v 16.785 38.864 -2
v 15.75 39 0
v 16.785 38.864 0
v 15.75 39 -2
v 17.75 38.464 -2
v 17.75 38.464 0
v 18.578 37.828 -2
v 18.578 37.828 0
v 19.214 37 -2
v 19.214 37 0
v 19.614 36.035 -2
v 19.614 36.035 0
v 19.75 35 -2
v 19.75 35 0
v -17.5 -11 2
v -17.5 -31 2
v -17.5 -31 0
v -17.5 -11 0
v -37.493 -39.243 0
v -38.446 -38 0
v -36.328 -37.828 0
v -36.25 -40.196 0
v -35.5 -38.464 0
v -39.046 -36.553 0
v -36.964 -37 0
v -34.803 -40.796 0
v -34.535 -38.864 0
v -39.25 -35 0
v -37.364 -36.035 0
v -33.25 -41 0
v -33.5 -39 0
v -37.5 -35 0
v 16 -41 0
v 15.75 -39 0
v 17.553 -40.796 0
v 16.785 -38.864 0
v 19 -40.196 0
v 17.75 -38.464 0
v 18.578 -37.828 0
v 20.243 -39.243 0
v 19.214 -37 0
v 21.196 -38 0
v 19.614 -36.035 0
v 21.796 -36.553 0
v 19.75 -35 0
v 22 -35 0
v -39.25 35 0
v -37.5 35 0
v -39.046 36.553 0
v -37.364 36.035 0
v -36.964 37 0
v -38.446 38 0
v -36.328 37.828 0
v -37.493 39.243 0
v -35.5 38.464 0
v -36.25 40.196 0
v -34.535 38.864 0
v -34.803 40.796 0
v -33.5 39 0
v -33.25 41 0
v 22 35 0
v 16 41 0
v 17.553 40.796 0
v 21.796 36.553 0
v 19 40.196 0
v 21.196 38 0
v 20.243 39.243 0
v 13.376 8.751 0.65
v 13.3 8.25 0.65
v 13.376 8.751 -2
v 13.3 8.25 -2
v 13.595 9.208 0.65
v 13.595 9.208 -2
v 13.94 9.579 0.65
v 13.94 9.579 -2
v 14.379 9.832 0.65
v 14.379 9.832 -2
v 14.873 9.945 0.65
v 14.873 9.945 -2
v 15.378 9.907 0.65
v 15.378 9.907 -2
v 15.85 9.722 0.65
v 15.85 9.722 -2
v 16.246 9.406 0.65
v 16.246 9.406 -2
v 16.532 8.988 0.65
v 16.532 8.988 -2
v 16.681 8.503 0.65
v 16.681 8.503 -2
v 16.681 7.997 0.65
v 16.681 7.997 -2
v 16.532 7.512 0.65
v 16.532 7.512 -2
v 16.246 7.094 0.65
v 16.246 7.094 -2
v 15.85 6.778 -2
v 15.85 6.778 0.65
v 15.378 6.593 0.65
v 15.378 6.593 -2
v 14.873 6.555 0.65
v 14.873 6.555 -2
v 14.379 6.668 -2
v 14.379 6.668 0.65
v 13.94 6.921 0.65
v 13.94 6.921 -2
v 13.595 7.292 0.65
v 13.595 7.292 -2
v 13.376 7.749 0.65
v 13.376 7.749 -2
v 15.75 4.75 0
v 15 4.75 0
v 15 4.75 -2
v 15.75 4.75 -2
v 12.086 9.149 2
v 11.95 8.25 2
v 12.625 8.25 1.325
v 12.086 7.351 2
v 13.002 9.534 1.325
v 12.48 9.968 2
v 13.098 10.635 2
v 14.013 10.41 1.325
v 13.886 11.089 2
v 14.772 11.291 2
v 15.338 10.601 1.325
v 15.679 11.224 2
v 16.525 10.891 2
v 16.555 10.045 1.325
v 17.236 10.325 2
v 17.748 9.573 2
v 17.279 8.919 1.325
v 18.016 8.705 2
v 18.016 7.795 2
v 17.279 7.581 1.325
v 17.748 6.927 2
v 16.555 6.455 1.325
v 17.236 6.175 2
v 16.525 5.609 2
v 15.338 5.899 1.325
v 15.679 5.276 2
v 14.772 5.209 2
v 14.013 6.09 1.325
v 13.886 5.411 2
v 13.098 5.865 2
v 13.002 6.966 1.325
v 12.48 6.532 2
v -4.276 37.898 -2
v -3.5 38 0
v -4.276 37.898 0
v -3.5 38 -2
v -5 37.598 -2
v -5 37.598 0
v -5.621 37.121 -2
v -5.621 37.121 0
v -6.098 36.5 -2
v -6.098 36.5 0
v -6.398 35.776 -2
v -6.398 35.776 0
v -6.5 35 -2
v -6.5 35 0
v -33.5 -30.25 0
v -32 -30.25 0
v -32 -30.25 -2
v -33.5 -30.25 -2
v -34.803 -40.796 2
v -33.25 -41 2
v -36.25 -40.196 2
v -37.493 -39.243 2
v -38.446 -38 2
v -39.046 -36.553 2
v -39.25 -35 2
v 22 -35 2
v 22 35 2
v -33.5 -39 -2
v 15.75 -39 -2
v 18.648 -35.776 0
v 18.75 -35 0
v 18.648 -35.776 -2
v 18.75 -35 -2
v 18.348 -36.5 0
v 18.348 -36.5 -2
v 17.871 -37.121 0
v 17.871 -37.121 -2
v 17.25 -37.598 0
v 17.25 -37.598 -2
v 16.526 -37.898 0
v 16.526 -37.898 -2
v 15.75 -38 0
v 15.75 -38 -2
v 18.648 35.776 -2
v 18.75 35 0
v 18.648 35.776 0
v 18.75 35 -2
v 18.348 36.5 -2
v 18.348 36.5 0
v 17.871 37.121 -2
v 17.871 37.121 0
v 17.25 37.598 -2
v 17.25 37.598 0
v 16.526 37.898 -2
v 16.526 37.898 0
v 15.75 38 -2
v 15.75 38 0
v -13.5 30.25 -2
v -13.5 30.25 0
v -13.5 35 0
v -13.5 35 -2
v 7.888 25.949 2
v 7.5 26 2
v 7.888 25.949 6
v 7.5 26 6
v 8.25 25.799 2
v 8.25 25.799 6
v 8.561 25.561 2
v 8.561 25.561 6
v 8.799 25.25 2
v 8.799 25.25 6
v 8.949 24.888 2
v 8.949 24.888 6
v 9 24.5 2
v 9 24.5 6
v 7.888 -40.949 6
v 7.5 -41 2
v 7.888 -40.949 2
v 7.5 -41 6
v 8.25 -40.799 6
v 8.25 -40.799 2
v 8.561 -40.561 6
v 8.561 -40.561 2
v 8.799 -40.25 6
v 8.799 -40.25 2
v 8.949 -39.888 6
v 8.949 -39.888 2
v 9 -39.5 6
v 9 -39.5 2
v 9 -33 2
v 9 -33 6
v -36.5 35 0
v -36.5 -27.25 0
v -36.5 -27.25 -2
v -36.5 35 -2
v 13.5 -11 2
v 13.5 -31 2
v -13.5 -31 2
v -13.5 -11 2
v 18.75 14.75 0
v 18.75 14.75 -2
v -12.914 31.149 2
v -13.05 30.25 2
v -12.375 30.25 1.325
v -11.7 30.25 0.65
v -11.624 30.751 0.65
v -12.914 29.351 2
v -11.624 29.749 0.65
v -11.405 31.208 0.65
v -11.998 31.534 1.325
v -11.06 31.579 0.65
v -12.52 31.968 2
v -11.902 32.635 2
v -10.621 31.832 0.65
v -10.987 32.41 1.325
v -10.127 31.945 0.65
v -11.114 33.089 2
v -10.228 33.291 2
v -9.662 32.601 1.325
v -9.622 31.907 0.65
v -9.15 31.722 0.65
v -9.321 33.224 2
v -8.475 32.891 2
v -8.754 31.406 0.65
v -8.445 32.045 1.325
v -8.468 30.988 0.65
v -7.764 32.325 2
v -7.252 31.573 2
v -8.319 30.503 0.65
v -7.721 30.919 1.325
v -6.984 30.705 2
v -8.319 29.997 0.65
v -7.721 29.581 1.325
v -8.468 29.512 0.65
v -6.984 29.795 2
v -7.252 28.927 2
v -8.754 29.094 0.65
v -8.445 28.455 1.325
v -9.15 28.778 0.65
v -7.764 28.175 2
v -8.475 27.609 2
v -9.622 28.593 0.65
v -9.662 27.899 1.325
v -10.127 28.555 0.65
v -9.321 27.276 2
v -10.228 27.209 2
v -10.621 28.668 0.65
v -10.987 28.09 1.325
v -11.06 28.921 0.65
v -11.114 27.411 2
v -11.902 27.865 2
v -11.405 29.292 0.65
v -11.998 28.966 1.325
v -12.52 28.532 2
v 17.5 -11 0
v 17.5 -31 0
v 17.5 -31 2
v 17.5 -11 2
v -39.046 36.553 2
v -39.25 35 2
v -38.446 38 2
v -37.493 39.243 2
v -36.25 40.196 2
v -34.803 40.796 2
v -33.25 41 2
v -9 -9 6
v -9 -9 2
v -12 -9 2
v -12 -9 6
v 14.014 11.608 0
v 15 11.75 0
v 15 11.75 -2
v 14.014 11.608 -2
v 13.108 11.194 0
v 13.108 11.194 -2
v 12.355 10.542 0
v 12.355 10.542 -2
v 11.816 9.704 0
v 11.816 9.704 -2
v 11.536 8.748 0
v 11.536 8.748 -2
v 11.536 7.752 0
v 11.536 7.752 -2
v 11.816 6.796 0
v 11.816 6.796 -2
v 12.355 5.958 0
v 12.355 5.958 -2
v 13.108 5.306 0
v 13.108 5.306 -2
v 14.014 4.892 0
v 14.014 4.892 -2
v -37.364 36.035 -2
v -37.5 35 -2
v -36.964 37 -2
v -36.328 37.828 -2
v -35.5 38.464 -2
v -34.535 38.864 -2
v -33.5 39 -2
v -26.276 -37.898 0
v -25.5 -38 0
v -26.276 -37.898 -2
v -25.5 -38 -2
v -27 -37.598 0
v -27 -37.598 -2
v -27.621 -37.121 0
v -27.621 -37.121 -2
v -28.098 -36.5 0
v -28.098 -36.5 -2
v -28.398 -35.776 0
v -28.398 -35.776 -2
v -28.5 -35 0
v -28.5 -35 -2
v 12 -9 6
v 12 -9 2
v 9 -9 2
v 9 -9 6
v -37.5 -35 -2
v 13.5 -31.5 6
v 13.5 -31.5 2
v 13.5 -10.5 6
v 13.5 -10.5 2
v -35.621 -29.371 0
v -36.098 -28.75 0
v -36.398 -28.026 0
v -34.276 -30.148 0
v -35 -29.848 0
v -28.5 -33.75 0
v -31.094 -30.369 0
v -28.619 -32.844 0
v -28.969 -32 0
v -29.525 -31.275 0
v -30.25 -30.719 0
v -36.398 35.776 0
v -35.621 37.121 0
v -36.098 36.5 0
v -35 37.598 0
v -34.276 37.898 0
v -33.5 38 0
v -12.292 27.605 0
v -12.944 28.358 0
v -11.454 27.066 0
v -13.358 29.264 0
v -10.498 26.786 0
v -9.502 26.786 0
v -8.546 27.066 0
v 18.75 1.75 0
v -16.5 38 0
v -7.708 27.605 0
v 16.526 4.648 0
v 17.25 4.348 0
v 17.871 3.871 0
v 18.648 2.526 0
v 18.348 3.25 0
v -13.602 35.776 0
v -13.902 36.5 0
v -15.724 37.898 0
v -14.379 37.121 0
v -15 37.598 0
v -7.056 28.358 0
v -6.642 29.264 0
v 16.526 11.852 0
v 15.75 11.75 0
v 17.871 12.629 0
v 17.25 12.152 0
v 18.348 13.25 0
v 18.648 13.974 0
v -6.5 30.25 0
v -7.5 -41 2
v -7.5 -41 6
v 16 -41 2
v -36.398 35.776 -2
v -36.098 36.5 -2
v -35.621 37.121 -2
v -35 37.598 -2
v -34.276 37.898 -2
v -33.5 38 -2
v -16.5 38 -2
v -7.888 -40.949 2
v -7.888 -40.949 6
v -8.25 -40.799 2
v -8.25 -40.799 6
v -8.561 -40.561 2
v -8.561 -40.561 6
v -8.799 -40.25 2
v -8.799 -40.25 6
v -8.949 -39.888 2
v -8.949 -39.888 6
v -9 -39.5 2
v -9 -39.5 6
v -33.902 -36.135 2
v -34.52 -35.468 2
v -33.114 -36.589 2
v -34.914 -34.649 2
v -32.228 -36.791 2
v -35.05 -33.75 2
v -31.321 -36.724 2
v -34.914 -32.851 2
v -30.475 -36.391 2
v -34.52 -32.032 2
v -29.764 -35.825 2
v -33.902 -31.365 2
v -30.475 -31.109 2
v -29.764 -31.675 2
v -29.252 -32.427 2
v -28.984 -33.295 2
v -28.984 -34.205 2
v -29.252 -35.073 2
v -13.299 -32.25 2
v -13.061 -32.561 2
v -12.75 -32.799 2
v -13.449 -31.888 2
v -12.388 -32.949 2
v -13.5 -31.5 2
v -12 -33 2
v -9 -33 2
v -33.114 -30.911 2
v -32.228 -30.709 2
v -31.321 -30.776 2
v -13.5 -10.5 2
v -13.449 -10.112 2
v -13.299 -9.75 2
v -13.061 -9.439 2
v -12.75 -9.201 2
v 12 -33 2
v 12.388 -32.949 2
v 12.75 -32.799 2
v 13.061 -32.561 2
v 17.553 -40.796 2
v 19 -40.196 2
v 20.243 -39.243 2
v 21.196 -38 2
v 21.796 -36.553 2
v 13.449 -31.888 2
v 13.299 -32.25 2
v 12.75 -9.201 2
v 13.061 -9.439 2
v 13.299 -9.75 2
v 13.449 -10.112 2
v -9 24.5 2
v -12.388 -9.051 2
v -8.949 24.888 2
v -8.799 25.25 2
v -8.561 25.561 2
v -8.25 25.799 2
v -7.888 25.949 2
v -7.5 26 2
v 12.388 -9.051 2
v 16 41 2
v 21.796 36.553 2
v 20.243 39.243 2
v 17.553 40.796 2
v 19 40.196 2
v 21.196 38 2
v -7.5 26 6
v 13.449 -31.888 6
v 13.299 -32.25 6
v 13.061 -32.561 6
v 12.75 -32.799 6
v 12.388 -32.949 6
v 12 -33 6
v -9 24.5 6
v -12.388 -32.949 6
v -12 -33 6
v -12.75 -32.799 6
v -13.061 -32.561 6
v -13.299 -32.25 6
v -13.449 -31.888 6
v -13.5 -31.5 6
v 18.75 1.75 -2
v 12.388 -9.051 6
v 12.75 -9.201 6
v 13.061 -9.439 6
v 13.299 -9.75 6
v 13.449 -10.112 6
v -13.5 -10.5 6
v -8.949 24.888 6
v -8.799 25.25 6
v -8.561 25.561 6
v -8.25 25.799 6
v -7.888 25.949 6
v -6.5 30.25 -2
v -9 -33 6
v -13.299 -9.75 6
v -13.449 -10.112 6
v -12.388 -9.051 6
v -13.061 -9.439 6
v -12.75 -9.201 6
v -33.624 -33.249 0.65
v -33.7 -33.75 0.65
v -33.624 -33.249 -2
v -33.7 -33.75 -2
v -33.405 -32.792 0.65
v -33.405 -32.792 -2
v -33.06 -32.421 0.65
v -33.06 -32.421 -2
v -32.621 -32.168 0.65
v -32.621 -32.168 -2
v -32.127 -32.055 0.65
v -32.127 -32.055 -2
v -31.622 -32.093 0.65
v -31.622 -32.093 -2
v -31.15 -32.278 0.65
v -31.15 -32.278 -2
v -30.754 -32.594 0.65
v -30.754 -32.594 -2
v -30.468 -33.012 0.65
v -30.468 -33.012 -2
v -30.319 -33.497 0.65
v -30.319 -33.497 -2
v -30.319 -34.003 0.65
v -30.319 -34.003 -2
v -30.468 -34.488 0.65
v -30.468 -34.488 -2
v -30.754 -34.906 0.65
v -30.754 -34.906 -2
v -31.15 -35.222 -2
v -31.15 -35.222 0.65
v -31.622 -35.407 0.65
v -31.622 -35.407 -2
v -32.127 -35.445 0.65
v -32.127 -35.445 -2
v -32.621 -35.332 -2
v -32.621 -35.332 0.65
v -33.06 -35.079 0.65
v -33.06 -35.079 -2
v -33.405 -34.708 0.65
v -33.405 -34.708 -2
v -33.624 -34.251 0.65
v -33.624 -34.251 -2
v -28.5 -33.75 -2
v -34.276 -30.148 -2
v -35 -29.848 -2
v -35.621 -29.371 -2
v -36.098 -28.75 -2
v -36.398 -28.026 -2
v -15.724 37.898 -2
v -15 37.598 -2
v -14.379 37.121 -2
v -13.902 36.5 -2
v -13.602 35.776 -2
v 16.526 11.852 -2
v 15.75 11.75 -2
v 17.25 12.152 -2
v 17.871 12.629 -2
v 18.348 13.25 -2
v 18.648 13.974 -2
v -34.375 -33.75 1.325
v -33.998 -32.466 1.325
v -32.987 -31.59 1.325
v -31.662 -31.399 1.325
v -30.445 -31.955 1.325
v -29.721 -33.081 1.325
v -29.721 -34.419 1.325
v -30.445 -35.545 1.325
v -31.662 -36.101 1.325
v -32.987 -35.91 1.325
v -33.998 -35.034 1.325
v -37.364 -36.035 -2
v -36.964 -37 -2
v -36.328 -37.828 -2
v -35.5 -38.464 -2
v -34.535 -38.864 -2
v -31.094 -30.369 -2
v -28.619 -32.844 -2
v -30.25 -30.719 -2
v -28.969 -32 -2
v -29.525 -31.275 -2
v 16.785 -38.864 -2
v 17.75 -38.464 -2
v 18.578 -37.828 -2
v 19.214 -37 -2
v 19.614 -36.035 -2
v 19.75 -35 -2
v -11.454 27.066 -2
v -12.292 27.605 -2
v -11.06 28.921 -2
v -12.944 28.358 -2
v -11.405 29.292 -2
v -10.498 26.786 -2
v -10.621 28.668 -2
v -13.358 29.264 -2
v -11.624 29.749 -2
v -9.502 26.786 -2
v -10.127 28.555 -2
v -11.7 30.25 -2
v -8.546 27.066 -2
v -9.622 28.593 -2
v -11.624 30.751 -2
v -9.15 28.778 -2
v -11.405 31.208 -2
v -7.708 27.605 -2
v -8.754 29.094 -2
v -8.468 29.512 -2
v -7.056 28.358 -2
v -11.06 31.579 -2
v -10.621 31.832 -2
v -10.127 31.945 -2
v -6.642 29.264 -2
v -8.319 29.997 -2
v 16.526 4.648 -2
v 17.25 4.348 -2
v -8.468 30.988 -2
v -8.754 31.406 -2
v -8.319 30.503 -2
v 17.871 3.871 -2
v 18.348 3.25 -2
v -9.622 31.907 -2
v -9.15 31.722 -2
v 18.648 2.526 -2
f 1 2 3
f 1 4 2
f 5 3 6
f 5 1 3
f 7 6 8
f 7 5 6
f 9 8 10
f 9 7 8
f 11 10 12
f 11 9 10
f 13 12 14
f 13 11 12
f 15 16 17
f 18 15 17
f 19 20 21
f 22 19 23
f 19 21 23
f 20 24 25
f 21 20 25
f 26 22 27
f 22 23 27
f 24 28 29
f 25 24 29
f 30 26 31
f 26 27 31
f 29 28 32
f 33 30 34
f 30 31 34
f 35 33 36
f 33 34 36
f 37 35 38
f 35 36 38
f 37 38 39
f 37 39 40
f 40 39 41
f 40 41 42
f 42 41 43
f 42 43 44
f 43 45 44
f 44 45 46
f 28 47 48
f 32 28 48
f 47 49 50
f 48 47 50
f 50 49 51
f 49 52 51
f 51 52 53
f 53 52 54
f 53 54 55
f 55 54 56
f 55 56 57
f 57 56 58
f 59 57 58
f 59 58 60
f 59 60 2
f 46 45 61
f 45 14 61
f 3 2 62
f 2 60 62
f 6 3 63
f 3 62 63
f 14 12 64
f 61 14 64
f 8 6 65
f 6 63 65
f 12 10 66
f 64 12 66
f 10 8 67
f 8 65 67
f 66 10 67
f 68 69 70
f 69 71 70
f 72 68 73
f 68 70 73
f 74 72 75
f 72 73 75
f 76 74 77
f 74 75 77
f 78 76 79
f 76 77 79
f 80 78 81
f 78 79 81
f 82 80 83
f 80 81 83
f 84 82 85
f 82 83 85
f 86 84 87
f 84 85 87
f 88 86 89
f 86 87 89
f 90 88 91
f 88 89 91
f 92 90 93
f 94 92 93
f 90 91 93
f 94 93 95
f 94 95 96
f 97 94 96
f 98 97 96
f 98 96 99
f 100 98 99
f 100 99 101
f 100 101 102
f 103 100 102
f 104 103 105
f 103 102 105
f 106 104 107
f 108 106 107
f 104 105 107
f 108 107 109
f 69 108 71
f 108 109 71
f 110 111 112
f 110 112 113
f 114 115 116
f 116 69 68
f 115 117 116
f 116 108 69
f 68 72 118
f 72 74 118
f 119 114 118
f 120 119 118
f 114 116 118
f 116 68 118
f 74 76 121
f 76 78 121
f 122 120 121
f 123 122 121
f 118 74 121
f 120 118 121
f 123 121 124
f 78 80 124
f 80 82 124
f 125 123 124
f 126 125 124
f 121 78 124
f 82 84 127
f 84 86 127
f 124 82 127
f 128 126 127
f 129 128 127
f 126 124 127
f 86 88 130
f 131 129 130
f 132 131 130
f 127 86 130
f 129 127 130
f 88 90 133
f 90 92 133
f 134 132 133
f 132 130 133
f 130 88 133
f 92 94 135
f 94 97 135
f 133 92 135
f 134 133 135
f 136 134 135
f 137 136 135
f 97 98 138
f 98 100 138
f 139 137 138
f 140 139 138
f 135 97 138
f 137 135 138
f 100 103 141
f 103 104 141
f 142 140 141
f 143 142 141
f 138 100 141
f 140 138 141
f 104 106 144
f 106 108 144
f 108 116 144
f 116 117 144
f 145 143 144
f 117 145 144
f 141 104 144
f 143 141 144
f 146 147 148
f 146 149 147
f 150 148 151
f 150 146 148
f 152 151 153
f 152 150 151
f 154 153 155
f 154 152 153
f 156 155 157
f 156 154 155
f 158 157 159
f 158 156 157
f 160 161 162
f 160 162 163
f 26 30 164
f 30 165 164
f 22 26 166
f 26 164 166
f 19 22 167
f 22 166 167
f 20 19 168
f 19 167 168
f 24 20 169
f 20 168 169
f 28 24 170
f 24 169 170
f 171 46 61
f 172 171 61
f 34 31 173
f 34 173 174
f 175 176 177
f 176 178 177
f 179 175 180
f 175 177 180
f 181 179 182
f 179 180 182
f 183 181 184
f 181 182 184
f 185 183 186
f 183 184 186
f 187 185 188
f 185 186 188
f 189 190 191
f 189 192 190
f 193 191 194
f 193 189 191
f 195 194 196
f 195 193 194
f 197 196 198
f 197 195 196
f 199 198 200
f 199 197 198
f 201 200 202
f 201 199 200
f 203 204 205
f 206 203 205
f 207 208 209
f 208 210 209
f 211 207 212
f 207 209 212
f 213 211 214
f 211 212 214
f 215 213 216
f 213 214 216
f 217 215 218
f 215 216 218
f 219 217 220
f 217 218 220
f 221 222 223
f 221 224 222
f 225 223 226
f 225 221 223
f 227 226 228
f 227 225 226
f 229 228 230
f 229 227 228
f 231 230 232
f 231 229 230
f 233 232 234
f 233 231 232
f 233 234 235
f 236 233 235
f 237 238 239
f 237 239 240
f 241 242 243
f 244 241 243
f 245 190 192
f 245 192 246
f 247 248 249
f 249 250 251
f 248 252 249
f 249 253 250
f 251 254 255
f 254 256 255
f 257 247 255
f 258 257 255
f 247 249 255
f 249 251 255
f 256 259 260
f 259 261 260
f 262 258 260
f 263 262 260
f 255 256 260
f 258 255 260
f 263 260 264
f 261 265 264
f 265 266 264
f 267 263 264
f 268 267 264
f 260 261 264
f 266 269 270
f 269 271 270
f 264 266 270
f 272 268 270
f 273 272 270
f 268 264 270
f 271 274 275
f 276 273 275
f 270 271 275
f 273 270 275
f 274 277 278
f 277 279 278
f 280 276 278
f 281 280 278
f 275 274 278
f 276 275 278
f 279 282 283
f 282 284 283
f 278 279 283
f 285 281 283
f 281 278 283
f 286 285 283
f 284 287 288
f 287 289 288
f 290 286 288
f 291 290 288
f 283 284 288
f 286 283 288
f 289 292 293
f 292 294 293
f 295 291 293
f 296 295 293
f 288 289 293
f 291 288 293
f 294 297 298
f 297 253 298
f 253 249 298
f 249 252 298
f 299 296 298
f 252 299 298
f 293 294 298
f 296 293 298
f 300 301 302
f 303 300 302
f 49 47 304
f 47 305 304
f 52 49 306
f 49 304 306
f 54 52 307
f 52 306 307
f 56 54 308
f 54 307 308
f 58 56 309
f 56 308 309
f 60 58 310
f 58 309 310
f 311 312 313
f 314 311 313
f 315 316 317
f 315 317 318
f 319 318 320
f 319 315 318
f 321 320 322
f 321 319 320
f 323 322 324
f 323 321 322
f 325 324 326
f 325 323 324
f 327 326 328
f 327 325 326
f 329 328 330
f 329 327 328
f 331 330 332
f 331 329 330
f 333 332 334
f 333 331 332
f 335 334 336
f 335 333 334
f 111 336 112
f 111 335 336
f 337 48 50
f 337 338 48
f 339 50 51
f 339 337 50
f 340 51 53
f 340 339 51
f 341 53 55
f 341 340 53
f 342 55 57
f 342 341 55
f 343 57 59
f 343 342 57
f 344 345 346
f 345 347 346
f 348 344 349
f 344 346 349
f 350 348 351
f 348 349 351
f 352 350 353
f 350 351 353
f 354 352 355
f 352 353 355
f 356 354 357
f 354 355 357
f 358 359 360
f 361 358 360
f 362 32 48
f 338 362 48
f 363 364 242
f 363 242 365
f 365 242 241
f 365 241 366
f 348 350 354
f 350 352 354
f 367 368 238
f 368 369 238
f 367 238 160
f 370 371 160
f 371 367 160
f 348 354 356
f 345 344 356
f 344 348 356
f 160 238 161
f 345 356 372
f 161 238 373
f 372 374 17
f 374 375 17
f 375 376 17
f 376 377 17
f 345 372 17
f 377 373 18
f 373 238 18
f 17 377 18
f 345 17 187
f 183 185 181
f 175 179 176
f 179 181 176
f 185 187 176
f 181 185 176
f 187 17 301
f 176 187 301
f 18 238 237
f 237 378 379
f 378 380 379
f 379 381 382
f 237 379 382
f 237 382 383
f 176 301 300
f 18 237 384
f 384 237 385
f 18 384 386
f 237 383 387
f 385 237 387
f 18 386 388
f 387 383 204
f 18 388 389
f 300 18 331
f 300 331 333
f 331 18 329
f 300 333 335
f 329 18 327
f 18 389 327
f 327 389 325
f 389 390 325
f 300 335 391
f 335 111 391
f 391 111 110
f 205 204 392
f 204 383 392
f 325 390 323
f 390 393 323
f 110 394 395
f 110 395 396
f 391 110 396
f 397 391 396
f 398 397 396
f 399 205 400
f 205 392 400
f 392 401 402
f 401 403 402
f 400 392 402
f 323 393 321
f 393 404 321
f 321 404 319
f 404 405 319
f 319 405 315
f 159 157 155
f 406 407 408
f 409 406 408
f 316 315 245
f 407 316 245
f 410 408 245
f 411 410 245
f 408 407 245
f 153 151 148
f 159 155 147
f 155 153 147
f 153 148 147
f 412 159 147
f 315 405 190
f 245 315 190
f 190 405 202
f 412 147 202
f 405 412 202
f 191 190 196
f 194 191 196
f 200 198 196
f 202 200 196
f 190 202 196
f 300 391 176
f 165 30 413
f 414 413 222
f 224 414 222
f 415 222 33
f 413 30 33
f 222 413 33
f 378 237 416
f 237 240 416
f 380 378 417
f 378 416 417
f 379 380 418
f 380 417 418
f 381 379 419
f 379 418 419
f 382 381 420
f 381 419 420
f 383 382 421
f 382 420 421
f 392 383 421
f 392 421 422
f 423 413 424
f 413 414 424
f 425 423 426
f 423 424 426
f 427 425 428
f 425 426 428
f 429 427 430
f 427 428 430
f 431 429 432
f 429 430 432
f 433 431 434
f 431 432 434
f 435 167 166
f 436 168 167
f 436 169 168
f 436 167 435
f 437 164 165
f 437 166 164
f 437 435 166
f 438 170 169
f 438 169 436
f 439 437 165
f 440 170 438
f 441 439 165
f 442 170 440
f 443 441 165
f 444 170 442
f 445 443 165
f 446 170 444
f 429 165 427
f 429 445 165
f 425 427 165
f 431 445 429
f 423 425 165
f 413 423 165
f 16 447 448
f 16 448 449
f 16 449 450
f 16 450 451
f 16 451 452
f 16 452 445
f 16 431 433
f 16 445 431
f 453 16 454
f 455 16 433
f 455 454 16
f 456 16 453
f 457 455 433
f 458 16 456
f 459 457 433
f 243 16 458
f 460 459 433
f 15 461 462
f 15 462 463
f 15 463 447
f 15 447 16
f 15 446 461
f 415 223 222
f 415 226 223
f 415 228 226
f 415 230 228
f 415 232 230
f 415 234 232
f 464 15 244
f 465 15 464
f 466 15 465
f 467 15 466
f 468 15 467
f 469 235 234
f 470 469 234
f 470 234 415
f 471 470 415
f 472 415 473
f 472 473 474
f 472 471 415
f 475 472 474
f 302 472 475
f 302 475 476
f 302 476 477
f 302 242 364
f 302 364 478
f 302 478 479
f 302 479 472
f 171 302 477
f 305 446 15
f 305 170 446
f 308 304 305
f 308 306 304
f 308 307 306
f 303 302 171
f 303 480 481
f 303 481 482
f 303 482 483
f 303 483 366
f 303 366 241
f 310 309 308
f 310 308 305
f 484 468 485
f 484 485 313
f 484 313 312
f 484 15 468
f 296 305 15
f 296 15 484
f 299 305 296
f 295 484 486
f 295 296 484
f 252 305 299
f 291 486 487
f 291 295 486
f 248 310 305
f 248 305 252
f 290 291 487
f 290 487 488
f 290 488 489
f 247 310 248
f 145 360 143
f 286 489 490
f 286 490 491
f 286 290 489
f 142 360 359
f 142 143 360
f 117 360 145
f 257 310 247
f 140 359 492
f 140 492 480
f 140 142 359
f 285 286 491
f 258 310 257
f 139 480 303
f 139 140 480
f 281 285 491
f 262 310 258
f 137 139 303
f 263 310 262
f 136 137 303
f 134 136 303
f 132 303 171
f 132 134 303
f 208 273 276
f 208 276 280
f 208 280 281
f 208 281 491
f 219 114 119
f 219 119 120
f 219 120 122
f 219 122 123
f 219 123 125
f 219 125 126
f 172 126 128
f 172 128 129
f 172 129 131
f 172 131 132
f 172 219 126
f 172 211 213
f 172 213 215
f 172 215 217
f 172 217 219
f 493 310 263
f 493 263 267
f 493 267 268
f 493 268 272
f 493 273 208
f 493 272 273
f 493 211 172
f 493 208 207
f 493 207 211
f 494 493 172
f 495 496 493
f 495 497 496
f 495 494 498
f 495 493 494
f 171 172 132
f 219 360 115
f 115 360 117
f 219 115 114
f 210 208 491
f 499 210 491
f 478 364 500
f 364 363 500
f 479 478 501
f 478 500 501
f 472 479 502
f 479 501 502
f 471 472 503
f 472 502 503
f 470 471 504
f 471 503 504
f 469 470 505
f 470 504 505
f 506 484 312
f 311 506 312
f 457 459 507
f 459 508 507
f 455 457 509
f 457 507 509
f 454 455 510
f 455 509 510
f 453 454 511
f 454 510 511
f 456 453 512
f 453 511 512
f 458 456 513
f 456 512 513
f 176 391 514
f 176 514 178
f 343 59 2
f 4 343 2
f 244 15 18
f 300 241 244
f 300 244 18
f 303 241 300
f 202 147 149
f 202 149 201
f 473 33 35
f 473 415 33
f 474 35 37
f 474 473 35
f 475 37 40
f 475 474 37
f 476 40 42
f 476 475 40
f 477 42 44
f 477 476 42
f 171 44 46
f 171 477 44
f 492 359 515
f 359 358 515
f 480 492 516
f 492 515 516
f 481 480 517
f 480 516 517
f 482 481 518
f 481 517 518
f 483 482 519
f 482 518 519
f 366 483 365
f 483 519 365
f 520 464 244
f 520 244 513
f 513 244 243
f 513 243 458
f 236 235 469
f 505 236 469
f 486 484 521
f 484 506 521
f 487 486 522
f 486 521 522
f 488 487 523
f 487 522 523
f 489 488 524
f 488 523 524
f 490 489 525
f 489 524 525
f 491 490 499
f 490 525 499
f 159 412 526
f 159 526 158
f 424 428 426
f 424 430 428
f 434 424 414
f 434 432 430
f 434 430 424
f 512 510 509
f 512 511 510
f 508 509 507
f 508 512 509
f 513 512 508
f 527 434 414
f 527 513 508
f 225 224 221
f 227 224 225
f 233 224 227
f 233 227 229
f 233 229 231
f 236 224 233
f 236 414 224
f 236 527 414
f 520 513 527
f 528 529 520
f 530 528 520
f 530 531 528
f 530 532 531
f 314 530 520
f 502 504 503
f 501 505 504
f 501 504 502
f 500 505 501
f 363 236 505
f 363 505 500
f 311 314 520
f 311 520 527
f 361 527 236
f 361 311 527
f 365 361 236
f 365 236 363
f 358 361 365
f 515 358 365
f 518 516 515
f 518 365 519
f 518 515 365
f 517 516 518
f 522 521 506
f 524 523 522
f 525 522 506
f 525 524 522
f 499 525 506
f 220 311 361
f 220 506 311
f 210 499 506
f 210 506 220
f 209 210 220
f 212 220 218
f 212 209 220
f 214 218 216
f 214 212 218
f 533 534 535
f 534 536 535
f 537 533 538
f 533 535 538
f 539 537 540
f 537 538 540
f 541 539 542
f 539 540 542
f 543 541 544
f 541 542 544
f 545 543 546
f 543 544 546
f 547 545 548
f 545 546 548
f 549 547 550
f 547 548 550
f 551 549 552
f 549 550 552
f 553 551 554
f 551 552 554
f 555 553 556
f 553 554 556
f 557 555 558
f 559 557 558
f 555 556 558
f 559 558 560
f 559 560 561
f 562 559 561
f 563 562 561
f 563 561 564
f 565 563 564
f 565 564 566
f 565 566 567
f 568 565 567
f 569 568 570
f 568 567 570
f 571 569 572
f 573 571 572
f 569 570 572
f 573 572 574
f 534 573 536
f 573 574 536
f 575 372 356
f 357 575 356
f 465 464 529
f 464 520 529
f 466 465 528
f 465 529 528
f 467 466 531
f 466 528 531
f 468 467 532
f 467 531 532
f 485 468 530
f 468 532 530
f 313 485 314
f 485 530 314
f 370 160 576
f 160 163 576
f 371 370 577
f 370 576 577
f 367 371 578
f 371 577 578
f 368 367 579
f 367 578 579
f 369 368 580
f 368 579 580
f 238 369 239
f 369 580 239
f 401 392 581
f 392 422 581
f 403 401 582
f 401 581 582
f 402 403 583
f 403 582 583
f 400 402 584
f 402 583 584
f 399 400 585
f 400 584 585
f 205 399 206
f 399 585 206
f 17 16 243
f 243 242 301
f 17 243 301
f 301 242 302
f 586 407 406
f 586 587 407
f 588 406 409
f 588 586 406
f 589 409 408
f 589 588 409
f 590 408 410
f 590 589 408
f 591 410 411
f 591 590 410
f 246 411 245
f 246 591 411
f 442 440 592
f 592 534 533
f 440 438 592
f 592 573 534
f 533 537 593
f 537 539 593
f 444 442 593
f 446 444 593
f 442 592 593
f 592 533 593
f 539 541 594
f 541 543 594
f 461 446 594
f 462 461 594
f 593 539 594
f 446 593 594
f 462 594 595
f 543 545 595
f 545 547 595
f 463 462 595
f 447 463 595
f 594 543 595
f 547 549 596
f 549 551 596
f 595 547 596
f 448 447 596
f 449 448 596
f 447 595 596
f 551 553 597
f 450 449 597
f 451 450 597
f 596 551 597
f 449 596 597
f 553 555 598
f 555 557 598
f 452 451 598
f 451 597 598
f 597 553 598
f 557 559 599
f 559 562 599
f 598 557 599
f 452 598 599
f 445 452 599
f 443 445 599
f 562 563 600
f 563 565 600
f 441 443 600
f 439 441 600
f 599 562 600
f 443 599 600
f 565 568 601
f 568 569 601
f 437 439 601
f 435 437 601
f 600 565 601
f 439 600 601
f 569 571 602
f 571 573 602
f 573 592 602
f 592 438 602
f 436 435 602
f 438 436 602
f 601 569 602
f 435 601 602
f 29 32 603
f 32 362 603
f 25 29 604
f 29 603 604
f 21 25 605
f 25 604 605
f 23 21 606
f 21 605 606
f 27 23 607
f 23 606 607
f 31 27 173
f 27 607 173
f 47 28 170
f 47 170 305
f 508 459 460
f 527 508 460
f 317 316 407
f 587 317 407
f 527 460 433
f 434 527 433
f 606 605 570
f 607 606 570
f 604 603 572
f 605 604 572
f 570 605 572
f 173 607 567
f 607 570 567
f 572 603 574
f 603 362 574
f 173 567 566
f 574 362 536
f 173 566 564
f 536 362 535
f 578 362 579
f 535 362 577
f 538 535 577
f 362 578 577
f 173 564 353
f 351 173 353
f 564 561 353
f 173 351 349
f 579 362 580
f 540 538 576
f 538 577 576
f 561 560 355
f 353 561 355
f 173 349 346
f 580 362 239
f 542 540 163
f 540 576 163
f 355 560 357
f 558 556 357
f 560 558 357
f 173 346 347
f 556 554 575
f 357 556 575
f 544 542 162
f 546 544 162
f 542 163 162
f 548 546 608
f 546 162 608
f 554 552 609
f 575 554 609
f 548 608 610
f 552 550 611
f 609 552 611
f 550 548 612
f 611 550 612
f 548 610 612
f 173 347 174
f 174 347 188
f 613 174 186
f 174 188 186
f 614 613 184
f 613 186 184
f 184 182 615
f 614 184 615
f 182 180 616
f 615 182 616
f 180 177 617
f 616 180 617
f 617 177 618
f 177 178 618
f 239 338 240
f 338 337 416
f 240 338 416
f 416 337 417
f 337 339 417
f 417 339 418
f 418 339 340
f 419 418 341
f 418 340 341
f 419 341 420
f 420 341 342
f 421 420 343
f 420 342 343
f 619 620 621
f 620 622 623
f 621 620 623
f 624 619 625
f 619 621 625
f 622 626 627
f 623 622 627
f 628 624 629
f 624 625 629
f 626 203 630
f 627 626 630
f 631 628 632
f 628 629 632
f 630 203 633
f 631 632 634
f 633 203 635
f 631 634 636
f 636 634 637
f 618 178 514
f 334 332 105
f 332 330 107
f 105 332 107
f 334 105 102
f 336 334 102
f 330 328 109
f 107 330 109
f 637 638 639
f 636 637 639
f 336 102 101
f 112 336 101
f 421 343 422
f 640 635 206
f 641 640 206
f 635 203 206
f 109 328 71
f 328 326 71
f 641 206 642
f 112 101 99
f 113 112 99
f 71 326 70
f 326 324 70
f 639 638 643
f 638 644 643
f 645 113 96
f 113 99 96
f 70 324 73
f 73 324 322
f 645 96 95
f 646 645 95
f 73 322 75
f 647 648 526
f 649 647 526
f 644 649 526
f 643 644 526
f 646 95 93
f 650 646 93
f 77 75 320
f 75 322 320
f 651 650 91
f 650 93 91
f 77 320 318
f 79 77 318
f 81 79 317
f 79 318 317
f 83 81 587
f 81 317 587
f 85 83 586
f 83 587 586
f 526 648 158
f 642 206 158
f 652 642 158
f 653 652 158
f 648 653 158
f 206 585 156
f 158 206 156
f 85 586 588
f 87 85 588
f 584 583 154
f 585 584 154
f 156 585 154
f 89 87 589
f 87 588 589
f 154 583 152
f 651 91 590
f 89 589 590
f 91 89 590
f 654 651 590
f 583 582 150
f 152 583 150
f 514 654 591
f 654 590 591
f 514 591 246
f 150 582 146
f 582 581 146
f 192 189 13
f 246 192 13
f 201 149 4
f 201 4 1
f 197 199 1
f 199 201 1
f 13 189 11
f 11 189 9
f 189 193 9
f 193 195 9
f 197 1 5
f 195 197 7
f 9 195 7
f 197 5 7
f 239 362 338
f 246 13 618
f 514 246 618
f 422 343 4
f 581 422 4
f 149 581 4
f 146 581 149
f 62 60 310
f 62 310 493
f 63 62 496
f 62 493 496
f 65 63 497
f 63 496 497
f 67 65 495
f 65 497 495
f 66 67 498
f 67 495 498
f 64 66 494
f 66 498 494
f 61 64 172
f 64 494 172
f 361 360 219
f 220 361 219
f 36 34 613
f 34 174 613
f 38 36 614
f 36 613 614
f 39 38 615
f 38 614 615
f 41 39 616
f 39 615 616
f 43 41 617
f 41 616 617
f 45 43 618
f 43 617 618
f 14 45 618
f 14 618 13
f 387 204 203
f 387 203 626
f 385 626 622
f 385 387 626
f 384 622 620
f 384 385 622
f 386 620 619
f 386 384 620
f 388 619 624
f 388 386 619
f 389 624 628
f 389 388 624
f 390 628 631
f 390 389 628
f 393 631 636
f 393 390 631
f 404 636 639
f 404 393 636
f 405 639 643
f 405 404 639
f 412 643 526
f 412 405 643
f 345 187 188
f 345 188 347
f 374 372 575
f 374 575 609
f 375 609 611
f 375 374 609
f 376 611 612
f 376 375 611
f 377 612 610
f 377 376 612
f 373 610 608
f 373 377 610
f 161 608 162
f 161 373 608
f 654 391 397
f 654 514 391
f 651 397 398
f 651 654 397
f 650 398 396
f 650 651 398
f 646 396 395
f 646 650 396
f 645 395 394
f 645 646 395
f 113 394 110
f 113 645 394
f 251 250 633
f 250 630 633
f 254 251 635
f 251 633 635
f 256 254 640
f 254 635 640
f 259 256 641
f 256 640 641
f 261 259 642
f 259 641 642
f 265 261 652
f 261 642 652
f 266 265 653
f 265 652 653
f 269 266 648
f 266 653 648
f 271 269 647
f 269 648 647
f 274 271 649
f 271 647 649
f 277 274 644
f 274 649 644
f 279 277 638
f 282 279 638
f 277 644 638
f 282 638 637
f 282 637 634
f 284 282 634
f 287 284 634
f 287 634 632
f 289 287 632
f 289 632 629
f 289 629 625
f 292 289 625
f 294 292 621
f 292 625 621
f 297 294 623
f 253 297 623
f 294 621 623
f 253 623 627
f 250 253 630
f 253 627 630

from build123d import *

# Parameters (mm, degrees)
SKETCH008_W      = 57.25
SKETCH008_H      = 78
PAD004_DEPTH     = 2
SKETCH009_W      = 61.25
SKETCH009_H      = 82
PAD005_DEPTH     = 2
PAD006_DEPTH     = 4
POCKET004_DEPTH  = 20
HOLE_D           = 3.4
HOLE_DEPTH       = 25
HOLE_CSINK_D     = 6.1
HOLE_CSINK_ANGLE = 90
FILLET003_R      = 3
FILLET004_R      = 4
FILLET005_R      = 1.5
FILLET006_R      = 6


with BuildPart() as part:
    # Sketch008 → Pad004 (new body)
    with BuildSketch(Plane.XY):
        with Locations((-8.875, 0)):
            Rectangle(SKETCH008_W, SKETCH008_H)
        with BuildLine():
            ThreePointArc((-13.5, 30.25), (-10, 26.75), (-6.5, 30.25))
            Line((-6.5, 30.25), (-6.5, 38))
            Line((-6.5, 38), (18.75, 38))
            Line((18.75, 38), (18.75, 11.75))
            Line((15, 11.75), (18.75, 11.75))
            ThreePointArc((15, 11.75), (11.5, 8.25), (15, 4.75))
            Line((15, 4.75), (18.75, 4.75))
            Line((18.75, 4.75), (18.75, -38))
            Line((18.75, -38), (-28.5, -38))
            Line((-28.5, -33.75), (-28.5, -38))
            ThreePointArc((-28.5, -33.75), (-29.525126, -31.275126), (-32, -30.25))
            Line((-32, -30.25), (-36.5, -30.25))
            Line((-36.5, -30.25), (-36.5, 38))
            Line((-36.5, 38), (-13.5, 38))
            Line((-13.5, 30.25), (-13.5, 38))
        make_face(mode=Mode.SUBTRACT)
    extrude(amount=-PAD004_DEPTH)

    # Sketch009 → Pad005 (join)
    with BuildSketch(Plane.XY):
        with Locations((-8.625, 0)):
            Rectangle(SKETCH009_W, SKETCH009_H)
    extrude(amount=PAD005_DEPTH)

    # Sketch010 (on DatumPlane) → Pad006 (join)
    with BuildSketch(Plane.XY.offset(2)):
        Polygon((-13.5, -33), (-9, -33), (-9, -41), (9, -41), (9, -33), (13.5, -33), (13.5, -9), (9, -9), (9, 26), (-9, 26), (-9, -9), (-13.5, -9), align=None)
    extrude(amount=PAD006_DEPTH)

    # Sketch011 (on DatumPlane) → Pocket004 (cut)
    with BuildSketch(Plane.XZ.offset(31)):
        Polygon((-17.5, 7), (-17.5, 0), (17.5, 0), (17.5, 7), (13.5, 7), (13.5, 2), (-13.5, 2), (-13.5, 7), align=None)
    extrude(amount=-POCKET004_DEPTH, mode=Mode.SUBTRACT)

    # Hole
    with Locations(Plane.XY.offset(2)):
        with Locations((-32, -33.75), (-10, 30.25), (15, 8.25)):
            CounterSinkHole(HOLE_D / 2, HOLE_CSINK_D / 2, depth=HOLE_DEPTH, counter_sink_angle=HOLE_CSINK_ANGLE)

    # Fillet003
    fillet003_edges = [part.edges().sort_by_distance(p)[0] for p in [
        (18.75, 4.75, -1),
        (18.75, 11.75, -1),
        (-6.5, 38, -1),
        (-13.5, 38, -1),
        (-36.5, -30.25, -1),
        (-28.5, -38, -1),
        (-36.5, 38, -1),
        (18.75, -38, -1),
        (18.75, 38, -1),
    ]]
    fillet(fillet003_edges, radius=FILLET003_R)

    # Fillet004
    fillet004_edges = [part.edges().sort_by_distance(p)[0] for p in [
        (19.75, -39, -1),
        (-37.5, -39, -1),
        (19.75, 39, -1),
        (-37.5, 39, -1),
    ]]
    fillet(fillet004_edges, radius=FILLET004_R)

    # Fillet005
    fillet005_edges = [part.edges().sort_by_distance(p)[0] for p in [
        (9, -41, 4),
        (-9, -41, 4),
        (13.5, -9, 4),
        (9, 26, 4),
        (-9, 26, 4),
        (-13.5, -9, 4),
        (-13.5, -33, 4),
        (13.5, -33, 4),
    ]]
    fillet(fillet005_edges, radius=FILLET005_R)

    # Fillet006
    fillet006_edges = [part.edges().sort_by_distance(p)[0] for p in [
        (-39.25, -41, 1),
        (22, -41, 1),
        (22, 41, 1),
        (-39.25, 41, 1),
    ]]
    fillet(fillet006_edges, radius=FILLET006_R)


solid = part.part
